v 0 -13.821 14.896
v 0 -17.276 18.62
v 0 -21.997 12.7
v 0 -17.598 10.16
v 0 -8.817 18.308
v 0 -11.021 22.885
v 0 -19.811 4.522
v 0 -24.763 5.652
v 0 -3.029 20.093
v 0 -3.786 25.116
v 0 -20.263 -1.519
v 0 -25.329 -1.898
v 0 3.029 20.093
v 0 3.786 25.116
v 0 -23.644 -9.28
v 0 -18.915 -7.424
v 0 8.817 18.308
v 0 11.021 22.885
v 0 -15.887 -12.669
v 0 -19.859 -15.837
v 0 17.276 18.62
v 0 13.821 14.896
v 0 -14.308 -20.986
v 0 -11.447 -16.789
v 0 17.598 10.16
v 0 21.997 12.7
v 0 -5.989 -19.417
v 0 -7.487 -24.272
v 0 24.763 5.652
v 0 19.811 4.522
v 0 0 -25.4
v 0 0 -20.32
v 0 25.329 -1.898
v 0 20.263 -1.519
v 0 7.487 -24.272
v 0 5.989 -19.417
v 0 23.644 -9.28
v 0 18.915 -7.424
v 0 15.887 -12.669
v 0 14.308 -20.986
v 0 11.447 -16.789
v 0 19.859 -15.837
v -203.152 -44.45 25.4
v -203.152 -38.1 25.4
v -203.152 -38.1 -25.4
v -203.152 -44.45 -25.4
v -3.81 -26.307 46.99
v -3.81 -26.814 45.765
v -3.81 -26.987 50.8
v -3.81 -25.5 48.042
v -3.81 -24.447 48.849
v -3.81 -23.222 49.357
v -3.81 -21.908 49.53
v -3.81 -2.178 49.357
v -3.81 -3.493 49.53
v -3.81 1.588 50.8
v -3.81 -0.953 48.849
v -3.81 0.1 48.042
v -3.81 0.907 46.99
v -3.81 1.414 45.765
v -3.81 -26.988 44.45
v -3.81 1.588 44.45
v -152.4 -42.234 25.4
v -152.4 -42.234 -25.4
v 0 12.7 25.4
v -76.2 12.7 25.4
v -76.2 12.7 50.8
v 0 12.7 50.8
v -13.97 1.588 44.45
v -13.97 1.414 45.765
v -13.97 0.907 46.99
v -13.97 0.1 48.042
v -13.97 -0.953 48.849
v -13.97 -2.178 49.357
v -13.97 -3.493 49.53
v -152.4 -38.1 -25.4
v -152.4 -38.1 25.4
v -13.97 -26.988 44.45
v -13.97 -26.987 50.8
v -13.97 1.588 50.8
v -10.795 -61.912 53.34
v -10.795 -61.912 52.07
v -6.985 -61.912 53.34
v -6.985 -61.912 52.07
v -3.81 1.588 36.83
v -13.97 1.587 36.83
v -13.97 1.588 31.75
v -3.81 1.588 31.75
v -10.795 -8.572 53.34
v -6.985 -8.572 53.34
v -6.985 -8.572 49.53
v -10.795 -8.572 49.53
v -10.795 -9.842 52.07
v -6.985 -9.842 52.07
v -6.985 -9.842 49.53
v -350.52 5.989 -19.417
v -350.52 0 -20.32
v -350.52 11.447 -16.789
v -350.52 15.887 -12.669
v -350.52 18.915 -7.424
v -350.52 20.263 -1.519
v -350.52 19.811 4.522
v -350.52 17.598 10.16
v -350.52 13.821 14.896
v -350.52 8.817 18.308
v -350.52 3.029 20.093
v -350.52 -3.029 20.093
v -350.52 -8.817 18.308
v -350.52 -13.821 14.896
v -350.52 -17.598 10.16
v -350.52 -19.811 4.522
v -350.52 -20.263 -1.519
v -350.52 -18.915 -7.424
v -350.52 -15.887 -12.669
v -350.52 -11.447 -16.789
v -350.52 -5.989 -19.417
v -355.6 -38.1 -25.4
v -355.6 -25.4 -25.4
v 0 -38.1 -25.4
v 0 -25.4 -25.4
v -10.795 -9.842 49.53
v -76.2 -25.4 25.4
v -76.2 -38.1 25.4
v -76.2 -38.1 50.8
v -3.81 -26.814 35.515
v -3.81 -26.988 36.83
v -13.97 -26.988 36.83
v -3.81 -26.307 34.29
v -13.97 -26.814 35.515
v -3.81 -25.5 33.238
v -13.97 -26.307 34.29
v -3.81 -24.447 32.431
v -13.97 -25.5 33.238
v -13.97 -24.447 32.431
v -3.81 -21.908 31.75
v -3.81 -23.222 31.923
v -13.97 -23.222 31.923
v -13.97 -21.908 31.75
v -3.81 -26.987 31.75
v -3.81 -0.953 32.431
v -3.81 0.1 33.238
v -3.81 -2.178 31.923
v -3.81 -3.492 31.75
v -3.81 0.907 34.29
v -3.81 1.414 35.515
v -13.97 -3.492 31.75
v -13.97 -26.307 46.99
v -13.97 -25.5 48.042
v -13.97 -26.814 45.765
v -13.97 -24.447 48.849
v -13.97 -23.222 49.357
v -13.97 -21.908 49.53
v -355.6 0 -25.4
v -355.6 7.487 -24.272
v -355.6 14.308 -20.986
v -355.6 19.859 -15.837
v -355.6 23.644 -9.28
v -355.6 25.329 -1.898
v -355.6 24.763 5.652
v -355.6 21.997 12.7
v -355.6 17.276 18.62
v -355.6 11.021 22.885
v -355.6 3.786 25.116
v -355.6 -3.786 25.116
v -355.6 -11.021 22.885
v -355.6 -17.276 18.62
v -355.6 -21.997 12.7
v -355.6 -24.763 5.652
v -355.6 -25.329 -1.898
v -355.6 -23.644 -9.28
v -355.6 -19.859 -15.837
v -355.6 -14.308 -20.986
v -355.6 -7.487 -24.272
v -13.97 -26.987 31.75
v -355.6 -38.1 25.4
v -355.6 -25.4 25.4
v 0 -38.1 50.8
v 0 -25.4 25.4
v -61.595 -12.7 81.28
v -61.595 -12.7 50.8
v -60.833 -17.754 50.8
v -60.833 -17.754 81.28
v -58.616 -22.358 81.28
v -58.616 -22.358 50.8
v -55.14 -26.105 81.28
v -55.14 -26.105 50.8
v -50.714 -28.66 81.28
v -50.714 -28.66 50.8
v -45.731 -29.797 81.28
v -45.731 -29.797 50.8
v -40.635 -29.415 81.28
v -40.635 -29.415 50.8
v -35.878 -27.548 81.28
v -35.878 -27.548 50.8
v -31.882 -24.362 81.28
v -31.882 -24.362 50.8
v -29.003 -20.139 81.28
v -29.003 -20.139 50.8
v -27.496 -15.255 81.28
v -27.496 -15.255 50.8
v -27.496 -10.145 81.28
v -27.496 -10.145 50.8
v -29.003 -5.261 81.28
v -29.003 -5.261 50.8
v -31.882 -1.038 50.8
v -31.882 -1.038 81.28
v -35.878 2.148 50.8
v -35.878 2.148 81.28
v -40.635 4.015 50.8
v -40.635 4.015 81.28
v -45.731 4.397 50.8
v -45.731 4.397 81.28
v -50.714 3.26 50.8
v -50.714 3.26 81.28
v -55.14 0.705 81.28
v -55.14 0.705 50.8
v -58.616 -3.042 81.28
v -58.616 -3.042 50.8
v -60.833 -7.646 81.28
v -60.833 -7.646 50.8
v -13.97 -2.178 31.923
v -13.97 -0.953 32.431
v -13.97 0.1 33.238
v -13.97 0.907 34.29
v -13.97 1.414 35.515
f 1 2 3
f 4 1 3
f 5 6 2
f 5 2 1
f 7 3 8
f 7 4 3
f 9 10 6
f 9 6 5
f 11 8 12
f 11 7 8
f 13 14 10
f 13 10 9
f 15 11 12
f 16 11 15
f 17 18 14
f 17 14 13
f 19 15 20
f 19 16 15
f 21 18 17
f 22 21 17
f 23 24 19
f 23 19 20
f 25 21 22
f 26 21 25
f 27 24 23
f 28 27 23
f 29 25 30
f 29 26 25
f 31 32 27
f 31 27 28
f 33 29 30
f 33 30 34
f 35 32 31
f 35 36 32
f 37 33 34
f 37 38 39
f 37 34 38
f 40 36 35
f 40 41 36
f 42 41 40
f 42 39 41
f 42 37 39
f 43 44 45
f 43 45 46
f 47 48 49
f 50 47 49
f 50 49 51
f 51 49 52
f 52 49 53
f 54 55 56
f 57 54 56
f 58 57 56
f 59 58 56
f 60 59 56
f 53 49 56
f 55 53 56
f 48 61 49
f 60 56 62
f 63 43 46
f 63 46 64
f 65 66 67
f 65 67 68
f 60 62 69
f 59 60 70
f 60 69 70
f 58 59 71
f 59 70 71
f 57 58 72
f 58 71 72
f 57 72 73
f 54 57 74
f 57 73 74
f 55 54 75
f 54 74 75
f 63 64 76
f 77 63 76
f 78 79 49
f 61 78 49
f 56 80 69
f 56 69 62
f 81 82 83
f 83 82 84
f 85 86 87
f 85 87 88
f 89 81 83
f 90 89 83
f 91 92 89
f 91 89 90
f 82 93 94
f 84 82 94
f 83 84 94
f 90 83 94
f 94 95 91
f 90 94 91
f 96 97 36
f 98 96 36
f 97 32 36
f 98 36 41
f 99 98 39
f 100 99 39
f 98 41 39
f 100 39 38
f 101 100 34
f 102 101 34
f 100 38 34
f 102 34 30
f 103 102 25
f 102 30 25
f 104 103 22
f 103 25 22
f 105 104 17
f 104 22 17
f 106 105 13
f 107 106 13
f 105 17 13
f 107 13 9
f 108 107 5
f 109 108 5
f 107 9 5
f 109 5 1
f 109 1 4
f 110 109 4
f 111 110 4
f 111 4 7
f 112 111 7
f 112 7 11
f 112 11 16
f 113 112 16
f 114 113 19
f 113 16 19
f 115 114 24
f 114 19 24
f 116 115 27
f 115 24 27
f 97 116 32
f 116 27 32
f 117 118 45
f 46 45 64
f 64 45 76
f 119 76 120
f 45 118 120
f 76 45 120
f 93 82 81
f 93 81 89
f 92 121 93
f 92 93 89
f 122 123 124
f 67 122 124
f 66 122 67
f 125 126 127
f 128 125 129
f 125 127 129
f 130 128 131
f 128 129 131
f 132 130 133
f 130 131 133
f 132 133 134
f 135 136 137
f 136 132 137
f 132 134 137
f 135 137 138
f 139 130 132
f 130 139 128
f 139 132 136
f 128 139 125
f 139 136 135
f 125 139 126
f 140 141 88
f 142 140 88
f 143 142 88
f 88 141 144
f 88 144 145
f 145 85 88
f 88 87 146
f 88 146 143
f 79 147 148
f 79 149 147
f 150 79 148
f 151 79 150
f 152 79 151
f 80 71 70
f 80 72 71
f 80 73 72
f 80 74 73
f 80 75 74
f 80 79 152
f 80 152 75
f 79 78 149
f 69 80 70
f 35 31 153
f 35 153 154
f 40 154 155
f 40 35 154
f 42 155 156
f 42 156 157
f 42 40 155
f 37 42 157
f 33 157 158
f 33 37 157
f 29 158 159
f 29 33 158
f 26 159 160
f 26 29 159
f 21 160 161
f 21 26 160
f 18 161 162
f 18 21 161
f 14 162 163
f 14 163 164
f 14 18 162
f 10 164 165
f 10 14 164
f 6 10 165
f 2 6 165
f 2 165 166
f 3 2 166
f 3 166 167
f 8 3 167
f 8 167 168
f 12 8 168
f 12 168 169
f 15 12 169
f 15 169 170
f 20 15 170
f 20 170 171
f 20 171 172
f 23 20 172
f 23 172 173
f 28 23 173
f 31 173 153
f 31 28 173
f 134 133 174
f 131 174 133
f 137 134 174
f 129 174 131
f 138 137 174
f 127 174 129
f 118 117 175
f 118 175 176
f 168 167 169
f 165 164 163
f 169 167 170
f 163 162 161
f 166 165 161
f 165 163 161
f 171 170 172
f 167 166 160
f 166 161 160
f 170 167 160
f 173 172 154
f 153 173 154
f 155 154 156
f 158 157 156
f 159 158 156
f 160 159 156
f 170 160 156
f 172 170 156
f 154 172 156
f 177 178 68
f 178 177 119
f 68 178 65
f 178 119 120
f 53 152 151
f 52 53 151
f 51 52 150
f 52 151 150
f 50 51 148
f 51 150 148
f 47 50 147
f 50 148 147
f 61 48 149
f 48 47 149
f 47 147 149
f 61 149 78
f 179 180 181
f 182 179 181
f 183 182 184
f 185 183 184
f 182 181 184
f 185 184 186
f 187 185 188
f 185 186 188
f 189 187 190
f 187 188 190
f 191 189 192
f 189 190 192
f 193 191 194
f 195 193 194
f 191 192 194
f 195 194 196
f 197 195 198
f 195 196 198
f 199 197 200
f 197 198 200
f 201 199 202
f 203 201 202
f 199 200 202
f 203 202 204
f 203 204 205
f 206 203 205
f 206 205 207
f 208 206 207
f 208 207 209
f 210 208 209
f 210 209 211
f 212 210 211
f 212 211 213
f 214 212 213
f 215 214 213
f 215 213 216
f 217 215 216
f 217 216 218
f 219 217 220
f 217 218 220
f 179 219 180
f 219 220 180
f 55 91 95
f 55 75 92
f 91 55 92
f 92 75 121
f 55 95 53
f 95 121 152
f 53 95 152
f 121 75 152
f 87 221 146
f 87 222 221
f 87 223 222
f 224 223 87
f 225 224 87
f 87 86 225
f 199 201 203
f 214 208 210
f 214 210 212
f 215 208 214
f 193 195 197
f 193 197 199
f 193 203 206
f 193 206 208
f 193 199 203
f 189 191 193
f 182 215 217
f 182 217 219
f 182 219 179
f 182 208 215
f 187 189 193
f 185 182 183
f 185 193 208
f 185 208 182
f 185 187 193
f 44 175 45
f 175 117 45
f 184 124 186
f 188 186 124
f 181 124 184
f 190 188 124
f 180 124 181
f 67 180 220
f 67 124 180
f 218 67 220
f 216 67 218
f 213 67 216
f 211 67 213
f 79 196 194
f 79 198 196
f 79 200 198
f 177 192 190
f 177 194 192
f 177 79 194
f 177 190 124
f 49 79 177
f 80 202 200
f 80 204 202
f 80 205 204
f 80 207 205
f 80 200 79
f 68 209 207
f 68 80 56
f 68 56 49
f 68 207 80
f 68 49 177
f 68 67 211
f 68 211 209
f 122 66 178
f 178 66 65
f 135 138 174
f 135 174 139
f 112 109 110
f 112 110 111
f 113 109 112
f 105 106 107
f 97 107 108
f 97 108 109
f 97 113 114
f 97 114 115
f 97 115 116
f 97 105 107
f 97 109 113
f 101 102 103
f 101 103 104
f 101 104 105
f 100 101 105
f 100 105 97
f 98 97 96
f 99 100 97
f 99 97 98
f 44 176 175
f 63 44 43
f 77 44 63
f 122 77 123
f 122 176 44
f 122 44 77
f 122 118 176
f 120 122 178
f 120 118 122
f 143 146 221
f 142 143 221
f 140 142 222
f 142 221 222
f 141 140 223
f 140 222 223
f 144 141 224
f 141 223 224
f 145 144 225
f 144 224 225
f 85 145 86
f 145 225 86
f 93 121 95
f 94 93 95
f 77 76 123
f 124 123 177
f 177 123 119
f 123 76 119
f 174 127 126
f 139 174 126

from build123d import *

# Parameters (mm, degrees)
SKETCH3_R                = 25.4
BOSS_EXTRUDE1_DEPTH      = 355.6
SHELL1_T                 = -5.08
BOSS_EXTRUDE2_DEPTH      = 25.4
BOSS_EXTRUDE2_DEPTH_BACK = 25.4
SKETCH4_W                = 355.6
SKETCH4_H                = 12.7
SKETCH5_W                = 76.2
SKETCH5_H                = 50.8
BOSS_EXTRUDE3_DEPTH      = 25.4
SKETCH6_W                = 10.16
SKETCH6_H                = 28.575
CUT_EXTRUDE1_DEPTH       = 19.05
BOSS_EXTRUDE4_REACH      = 349.481
SKETCH8_W                = 3.81
SKETCH8_H                = 1.27
BOSS_EXTRUDE5_DEPTH      = 2.54
SKETCH10_W               = 3.81
SKETCH10_H               = 53.34
BOSS_EXTRUDE6_DEPTH      = 1.27
SKETCH11_R               = 17.145
BOSS_EXTRUDE7_DEPTH      = 30.48
BOSS_EXTRUDE8_START      = -25.4
BOSS_EXTRUDE8_DEPTH      = 50.8


with BuildPart() as part:
    # Sketch3 → Boss-Extrude1 (new body)
    with BuildSketch(Plane(origin=(0, 0, 0), x_dir=(0, 0, -1), z_dir=(1, 0, 0))):
        Circle(SKETCH3_R)
    extrude(amount=-BOSS_EXTRUDE1_DEPTH)

    # Shell1
    shell1_openings = [part.faces().sort_by_distance(p)[0] for p in [
        (0, 0, 0),
    ]]
    offset(amount=SHELL1_T, openings=shell1_openings, kind=Kind.INTERSECTION)


with BuildPart() as body_2:
    # Sketch4 → Boss-Extrude2 (new, two sides: drawn at the far end of the back side and taken through both)
    with BuildSketch(Plane.XY.offset(-BOSS_EXTRUDE2_DEPTH_BACK)):
        with Locations((-177.8, -31.75)):
            Rectangle(SKETCH4_W, SKETCH4_H)
    extrude(amount=BOSS_EXTRUDE2_DEPTH + BOSS_EXTRUDE2_DEPTH_BACK)

    # Sketch5 → Boss-Extrude3 (add)
    with BuildSketch(Plane.XY.offset(25.4)):
        with Locations((-38.1, -12.7)):
            Rectangle(SKETCH5_W, SKETCH5_H)
    extrude(amount=BOSS_EXTRUDE3_DEPTH)

    # Sketch6 → Cut-Extrude1 (cut)
    with BuildSketch(Plane.XY.offset(50.8)):
        with Locations((-8.89, -12.7)):
            Rectangle(SKETCH6_W, SKETCH6_H)
    extrude(amount=-CUT_EXTRUDE1_DEPTH, mode=Mode.SUBTRACT)

    # Sketch7 → Boss-Extrude4 (add, up to next)
    with BuildSketch(Plane(origin=(-13.97, 0, 0), x_dir=(0, 0, -1), z_dir=(1, 0, 0)), mode=Mode.PRIVATE) as boss_extrude4_sk1:
        with BuildLine():
            Line((-44.45, -26.9875), (-36.83, -26.9875))
            ThreePointArc((-36.83, -26.9875), (-33.237897552, -25.499602448), (-31.75, -21.9075))
            Line((-31.75, -21.9075), (-31.75, -3.4925))
            ThreePointArc((-31.75, -3.4925), (-33.237897552, 0.099602448), (-36.83, 1.5875))
            Line((-36.83, 1.5875), (-44.45, 1.5875))
            ThreePointArc((-44.45, 1.5875), (-48.042102448, 0.099602448), (-49.53, -3.4925))
            Line((-49.53, -3.4925), (-49.53, -21.9075))
            ThreePointArc((-49.53, -21.9075), (-48.042102448, -25.499602448), (-44.45, -26.9875))
        make_face()
    boss_extrude4_tool1 = extrude(boss_extrude4_sk1.sketch, amount=BOSS_EXTRUDE4_REACH, mode=Mode.PRIVATE) - body_2.part
    add(boss_extrude4_tool1.solids().sort_by_distance((-13.97, -12.7, 40.64))[0])

    # Sketch8 → Boss-Extrude5 (add)
    with BuildSketch(Plane.XY.offset(49.53)):
        with Locations((-8.89, -9.2075)):
            Rectangle(SKETCH8_W, SKETCH8_H)
    extrude(amount=BOSS_EXTRUDE5_DEPTH)

    # Sketch10 → Boss-Extrude6 (add)
    with BuildSketch(Plane.XY.offset(52.07)):
        with Locations((-8.89, -35.2425)):
            Rectangle(SKETCH10_W, SKETCH10_H)
    extrude(amount=BOSS_EXTRUDE6_DEPTH)

    # Sketch11 → Boss-Extrude7 (add)
    with BuildSketch(Plane.XY.offset(50.8)):
        with Locations(Location((-44.45, -12.7, 0), (0, 0, 180))):
            Circle(SKETCH11_R)
    extrude(amount=BOSS_EXTRUDE7_DEPTH)

    # Sketch12 → Boss-Extrude8 (add)
    with BuildSketch(Plane.XY.offset(BOSS_EXTRUDE8_START)):
        Polygon((-203.151649656, -44.45), (-152.4, -42.234135122), (-152.4, -38.1), (-203.151649656, -38.1), align=None)
    extrude(amount=BOSS_EXTRUDE8_DEPTH)


solid = Compound([part.part, body_2.part])
